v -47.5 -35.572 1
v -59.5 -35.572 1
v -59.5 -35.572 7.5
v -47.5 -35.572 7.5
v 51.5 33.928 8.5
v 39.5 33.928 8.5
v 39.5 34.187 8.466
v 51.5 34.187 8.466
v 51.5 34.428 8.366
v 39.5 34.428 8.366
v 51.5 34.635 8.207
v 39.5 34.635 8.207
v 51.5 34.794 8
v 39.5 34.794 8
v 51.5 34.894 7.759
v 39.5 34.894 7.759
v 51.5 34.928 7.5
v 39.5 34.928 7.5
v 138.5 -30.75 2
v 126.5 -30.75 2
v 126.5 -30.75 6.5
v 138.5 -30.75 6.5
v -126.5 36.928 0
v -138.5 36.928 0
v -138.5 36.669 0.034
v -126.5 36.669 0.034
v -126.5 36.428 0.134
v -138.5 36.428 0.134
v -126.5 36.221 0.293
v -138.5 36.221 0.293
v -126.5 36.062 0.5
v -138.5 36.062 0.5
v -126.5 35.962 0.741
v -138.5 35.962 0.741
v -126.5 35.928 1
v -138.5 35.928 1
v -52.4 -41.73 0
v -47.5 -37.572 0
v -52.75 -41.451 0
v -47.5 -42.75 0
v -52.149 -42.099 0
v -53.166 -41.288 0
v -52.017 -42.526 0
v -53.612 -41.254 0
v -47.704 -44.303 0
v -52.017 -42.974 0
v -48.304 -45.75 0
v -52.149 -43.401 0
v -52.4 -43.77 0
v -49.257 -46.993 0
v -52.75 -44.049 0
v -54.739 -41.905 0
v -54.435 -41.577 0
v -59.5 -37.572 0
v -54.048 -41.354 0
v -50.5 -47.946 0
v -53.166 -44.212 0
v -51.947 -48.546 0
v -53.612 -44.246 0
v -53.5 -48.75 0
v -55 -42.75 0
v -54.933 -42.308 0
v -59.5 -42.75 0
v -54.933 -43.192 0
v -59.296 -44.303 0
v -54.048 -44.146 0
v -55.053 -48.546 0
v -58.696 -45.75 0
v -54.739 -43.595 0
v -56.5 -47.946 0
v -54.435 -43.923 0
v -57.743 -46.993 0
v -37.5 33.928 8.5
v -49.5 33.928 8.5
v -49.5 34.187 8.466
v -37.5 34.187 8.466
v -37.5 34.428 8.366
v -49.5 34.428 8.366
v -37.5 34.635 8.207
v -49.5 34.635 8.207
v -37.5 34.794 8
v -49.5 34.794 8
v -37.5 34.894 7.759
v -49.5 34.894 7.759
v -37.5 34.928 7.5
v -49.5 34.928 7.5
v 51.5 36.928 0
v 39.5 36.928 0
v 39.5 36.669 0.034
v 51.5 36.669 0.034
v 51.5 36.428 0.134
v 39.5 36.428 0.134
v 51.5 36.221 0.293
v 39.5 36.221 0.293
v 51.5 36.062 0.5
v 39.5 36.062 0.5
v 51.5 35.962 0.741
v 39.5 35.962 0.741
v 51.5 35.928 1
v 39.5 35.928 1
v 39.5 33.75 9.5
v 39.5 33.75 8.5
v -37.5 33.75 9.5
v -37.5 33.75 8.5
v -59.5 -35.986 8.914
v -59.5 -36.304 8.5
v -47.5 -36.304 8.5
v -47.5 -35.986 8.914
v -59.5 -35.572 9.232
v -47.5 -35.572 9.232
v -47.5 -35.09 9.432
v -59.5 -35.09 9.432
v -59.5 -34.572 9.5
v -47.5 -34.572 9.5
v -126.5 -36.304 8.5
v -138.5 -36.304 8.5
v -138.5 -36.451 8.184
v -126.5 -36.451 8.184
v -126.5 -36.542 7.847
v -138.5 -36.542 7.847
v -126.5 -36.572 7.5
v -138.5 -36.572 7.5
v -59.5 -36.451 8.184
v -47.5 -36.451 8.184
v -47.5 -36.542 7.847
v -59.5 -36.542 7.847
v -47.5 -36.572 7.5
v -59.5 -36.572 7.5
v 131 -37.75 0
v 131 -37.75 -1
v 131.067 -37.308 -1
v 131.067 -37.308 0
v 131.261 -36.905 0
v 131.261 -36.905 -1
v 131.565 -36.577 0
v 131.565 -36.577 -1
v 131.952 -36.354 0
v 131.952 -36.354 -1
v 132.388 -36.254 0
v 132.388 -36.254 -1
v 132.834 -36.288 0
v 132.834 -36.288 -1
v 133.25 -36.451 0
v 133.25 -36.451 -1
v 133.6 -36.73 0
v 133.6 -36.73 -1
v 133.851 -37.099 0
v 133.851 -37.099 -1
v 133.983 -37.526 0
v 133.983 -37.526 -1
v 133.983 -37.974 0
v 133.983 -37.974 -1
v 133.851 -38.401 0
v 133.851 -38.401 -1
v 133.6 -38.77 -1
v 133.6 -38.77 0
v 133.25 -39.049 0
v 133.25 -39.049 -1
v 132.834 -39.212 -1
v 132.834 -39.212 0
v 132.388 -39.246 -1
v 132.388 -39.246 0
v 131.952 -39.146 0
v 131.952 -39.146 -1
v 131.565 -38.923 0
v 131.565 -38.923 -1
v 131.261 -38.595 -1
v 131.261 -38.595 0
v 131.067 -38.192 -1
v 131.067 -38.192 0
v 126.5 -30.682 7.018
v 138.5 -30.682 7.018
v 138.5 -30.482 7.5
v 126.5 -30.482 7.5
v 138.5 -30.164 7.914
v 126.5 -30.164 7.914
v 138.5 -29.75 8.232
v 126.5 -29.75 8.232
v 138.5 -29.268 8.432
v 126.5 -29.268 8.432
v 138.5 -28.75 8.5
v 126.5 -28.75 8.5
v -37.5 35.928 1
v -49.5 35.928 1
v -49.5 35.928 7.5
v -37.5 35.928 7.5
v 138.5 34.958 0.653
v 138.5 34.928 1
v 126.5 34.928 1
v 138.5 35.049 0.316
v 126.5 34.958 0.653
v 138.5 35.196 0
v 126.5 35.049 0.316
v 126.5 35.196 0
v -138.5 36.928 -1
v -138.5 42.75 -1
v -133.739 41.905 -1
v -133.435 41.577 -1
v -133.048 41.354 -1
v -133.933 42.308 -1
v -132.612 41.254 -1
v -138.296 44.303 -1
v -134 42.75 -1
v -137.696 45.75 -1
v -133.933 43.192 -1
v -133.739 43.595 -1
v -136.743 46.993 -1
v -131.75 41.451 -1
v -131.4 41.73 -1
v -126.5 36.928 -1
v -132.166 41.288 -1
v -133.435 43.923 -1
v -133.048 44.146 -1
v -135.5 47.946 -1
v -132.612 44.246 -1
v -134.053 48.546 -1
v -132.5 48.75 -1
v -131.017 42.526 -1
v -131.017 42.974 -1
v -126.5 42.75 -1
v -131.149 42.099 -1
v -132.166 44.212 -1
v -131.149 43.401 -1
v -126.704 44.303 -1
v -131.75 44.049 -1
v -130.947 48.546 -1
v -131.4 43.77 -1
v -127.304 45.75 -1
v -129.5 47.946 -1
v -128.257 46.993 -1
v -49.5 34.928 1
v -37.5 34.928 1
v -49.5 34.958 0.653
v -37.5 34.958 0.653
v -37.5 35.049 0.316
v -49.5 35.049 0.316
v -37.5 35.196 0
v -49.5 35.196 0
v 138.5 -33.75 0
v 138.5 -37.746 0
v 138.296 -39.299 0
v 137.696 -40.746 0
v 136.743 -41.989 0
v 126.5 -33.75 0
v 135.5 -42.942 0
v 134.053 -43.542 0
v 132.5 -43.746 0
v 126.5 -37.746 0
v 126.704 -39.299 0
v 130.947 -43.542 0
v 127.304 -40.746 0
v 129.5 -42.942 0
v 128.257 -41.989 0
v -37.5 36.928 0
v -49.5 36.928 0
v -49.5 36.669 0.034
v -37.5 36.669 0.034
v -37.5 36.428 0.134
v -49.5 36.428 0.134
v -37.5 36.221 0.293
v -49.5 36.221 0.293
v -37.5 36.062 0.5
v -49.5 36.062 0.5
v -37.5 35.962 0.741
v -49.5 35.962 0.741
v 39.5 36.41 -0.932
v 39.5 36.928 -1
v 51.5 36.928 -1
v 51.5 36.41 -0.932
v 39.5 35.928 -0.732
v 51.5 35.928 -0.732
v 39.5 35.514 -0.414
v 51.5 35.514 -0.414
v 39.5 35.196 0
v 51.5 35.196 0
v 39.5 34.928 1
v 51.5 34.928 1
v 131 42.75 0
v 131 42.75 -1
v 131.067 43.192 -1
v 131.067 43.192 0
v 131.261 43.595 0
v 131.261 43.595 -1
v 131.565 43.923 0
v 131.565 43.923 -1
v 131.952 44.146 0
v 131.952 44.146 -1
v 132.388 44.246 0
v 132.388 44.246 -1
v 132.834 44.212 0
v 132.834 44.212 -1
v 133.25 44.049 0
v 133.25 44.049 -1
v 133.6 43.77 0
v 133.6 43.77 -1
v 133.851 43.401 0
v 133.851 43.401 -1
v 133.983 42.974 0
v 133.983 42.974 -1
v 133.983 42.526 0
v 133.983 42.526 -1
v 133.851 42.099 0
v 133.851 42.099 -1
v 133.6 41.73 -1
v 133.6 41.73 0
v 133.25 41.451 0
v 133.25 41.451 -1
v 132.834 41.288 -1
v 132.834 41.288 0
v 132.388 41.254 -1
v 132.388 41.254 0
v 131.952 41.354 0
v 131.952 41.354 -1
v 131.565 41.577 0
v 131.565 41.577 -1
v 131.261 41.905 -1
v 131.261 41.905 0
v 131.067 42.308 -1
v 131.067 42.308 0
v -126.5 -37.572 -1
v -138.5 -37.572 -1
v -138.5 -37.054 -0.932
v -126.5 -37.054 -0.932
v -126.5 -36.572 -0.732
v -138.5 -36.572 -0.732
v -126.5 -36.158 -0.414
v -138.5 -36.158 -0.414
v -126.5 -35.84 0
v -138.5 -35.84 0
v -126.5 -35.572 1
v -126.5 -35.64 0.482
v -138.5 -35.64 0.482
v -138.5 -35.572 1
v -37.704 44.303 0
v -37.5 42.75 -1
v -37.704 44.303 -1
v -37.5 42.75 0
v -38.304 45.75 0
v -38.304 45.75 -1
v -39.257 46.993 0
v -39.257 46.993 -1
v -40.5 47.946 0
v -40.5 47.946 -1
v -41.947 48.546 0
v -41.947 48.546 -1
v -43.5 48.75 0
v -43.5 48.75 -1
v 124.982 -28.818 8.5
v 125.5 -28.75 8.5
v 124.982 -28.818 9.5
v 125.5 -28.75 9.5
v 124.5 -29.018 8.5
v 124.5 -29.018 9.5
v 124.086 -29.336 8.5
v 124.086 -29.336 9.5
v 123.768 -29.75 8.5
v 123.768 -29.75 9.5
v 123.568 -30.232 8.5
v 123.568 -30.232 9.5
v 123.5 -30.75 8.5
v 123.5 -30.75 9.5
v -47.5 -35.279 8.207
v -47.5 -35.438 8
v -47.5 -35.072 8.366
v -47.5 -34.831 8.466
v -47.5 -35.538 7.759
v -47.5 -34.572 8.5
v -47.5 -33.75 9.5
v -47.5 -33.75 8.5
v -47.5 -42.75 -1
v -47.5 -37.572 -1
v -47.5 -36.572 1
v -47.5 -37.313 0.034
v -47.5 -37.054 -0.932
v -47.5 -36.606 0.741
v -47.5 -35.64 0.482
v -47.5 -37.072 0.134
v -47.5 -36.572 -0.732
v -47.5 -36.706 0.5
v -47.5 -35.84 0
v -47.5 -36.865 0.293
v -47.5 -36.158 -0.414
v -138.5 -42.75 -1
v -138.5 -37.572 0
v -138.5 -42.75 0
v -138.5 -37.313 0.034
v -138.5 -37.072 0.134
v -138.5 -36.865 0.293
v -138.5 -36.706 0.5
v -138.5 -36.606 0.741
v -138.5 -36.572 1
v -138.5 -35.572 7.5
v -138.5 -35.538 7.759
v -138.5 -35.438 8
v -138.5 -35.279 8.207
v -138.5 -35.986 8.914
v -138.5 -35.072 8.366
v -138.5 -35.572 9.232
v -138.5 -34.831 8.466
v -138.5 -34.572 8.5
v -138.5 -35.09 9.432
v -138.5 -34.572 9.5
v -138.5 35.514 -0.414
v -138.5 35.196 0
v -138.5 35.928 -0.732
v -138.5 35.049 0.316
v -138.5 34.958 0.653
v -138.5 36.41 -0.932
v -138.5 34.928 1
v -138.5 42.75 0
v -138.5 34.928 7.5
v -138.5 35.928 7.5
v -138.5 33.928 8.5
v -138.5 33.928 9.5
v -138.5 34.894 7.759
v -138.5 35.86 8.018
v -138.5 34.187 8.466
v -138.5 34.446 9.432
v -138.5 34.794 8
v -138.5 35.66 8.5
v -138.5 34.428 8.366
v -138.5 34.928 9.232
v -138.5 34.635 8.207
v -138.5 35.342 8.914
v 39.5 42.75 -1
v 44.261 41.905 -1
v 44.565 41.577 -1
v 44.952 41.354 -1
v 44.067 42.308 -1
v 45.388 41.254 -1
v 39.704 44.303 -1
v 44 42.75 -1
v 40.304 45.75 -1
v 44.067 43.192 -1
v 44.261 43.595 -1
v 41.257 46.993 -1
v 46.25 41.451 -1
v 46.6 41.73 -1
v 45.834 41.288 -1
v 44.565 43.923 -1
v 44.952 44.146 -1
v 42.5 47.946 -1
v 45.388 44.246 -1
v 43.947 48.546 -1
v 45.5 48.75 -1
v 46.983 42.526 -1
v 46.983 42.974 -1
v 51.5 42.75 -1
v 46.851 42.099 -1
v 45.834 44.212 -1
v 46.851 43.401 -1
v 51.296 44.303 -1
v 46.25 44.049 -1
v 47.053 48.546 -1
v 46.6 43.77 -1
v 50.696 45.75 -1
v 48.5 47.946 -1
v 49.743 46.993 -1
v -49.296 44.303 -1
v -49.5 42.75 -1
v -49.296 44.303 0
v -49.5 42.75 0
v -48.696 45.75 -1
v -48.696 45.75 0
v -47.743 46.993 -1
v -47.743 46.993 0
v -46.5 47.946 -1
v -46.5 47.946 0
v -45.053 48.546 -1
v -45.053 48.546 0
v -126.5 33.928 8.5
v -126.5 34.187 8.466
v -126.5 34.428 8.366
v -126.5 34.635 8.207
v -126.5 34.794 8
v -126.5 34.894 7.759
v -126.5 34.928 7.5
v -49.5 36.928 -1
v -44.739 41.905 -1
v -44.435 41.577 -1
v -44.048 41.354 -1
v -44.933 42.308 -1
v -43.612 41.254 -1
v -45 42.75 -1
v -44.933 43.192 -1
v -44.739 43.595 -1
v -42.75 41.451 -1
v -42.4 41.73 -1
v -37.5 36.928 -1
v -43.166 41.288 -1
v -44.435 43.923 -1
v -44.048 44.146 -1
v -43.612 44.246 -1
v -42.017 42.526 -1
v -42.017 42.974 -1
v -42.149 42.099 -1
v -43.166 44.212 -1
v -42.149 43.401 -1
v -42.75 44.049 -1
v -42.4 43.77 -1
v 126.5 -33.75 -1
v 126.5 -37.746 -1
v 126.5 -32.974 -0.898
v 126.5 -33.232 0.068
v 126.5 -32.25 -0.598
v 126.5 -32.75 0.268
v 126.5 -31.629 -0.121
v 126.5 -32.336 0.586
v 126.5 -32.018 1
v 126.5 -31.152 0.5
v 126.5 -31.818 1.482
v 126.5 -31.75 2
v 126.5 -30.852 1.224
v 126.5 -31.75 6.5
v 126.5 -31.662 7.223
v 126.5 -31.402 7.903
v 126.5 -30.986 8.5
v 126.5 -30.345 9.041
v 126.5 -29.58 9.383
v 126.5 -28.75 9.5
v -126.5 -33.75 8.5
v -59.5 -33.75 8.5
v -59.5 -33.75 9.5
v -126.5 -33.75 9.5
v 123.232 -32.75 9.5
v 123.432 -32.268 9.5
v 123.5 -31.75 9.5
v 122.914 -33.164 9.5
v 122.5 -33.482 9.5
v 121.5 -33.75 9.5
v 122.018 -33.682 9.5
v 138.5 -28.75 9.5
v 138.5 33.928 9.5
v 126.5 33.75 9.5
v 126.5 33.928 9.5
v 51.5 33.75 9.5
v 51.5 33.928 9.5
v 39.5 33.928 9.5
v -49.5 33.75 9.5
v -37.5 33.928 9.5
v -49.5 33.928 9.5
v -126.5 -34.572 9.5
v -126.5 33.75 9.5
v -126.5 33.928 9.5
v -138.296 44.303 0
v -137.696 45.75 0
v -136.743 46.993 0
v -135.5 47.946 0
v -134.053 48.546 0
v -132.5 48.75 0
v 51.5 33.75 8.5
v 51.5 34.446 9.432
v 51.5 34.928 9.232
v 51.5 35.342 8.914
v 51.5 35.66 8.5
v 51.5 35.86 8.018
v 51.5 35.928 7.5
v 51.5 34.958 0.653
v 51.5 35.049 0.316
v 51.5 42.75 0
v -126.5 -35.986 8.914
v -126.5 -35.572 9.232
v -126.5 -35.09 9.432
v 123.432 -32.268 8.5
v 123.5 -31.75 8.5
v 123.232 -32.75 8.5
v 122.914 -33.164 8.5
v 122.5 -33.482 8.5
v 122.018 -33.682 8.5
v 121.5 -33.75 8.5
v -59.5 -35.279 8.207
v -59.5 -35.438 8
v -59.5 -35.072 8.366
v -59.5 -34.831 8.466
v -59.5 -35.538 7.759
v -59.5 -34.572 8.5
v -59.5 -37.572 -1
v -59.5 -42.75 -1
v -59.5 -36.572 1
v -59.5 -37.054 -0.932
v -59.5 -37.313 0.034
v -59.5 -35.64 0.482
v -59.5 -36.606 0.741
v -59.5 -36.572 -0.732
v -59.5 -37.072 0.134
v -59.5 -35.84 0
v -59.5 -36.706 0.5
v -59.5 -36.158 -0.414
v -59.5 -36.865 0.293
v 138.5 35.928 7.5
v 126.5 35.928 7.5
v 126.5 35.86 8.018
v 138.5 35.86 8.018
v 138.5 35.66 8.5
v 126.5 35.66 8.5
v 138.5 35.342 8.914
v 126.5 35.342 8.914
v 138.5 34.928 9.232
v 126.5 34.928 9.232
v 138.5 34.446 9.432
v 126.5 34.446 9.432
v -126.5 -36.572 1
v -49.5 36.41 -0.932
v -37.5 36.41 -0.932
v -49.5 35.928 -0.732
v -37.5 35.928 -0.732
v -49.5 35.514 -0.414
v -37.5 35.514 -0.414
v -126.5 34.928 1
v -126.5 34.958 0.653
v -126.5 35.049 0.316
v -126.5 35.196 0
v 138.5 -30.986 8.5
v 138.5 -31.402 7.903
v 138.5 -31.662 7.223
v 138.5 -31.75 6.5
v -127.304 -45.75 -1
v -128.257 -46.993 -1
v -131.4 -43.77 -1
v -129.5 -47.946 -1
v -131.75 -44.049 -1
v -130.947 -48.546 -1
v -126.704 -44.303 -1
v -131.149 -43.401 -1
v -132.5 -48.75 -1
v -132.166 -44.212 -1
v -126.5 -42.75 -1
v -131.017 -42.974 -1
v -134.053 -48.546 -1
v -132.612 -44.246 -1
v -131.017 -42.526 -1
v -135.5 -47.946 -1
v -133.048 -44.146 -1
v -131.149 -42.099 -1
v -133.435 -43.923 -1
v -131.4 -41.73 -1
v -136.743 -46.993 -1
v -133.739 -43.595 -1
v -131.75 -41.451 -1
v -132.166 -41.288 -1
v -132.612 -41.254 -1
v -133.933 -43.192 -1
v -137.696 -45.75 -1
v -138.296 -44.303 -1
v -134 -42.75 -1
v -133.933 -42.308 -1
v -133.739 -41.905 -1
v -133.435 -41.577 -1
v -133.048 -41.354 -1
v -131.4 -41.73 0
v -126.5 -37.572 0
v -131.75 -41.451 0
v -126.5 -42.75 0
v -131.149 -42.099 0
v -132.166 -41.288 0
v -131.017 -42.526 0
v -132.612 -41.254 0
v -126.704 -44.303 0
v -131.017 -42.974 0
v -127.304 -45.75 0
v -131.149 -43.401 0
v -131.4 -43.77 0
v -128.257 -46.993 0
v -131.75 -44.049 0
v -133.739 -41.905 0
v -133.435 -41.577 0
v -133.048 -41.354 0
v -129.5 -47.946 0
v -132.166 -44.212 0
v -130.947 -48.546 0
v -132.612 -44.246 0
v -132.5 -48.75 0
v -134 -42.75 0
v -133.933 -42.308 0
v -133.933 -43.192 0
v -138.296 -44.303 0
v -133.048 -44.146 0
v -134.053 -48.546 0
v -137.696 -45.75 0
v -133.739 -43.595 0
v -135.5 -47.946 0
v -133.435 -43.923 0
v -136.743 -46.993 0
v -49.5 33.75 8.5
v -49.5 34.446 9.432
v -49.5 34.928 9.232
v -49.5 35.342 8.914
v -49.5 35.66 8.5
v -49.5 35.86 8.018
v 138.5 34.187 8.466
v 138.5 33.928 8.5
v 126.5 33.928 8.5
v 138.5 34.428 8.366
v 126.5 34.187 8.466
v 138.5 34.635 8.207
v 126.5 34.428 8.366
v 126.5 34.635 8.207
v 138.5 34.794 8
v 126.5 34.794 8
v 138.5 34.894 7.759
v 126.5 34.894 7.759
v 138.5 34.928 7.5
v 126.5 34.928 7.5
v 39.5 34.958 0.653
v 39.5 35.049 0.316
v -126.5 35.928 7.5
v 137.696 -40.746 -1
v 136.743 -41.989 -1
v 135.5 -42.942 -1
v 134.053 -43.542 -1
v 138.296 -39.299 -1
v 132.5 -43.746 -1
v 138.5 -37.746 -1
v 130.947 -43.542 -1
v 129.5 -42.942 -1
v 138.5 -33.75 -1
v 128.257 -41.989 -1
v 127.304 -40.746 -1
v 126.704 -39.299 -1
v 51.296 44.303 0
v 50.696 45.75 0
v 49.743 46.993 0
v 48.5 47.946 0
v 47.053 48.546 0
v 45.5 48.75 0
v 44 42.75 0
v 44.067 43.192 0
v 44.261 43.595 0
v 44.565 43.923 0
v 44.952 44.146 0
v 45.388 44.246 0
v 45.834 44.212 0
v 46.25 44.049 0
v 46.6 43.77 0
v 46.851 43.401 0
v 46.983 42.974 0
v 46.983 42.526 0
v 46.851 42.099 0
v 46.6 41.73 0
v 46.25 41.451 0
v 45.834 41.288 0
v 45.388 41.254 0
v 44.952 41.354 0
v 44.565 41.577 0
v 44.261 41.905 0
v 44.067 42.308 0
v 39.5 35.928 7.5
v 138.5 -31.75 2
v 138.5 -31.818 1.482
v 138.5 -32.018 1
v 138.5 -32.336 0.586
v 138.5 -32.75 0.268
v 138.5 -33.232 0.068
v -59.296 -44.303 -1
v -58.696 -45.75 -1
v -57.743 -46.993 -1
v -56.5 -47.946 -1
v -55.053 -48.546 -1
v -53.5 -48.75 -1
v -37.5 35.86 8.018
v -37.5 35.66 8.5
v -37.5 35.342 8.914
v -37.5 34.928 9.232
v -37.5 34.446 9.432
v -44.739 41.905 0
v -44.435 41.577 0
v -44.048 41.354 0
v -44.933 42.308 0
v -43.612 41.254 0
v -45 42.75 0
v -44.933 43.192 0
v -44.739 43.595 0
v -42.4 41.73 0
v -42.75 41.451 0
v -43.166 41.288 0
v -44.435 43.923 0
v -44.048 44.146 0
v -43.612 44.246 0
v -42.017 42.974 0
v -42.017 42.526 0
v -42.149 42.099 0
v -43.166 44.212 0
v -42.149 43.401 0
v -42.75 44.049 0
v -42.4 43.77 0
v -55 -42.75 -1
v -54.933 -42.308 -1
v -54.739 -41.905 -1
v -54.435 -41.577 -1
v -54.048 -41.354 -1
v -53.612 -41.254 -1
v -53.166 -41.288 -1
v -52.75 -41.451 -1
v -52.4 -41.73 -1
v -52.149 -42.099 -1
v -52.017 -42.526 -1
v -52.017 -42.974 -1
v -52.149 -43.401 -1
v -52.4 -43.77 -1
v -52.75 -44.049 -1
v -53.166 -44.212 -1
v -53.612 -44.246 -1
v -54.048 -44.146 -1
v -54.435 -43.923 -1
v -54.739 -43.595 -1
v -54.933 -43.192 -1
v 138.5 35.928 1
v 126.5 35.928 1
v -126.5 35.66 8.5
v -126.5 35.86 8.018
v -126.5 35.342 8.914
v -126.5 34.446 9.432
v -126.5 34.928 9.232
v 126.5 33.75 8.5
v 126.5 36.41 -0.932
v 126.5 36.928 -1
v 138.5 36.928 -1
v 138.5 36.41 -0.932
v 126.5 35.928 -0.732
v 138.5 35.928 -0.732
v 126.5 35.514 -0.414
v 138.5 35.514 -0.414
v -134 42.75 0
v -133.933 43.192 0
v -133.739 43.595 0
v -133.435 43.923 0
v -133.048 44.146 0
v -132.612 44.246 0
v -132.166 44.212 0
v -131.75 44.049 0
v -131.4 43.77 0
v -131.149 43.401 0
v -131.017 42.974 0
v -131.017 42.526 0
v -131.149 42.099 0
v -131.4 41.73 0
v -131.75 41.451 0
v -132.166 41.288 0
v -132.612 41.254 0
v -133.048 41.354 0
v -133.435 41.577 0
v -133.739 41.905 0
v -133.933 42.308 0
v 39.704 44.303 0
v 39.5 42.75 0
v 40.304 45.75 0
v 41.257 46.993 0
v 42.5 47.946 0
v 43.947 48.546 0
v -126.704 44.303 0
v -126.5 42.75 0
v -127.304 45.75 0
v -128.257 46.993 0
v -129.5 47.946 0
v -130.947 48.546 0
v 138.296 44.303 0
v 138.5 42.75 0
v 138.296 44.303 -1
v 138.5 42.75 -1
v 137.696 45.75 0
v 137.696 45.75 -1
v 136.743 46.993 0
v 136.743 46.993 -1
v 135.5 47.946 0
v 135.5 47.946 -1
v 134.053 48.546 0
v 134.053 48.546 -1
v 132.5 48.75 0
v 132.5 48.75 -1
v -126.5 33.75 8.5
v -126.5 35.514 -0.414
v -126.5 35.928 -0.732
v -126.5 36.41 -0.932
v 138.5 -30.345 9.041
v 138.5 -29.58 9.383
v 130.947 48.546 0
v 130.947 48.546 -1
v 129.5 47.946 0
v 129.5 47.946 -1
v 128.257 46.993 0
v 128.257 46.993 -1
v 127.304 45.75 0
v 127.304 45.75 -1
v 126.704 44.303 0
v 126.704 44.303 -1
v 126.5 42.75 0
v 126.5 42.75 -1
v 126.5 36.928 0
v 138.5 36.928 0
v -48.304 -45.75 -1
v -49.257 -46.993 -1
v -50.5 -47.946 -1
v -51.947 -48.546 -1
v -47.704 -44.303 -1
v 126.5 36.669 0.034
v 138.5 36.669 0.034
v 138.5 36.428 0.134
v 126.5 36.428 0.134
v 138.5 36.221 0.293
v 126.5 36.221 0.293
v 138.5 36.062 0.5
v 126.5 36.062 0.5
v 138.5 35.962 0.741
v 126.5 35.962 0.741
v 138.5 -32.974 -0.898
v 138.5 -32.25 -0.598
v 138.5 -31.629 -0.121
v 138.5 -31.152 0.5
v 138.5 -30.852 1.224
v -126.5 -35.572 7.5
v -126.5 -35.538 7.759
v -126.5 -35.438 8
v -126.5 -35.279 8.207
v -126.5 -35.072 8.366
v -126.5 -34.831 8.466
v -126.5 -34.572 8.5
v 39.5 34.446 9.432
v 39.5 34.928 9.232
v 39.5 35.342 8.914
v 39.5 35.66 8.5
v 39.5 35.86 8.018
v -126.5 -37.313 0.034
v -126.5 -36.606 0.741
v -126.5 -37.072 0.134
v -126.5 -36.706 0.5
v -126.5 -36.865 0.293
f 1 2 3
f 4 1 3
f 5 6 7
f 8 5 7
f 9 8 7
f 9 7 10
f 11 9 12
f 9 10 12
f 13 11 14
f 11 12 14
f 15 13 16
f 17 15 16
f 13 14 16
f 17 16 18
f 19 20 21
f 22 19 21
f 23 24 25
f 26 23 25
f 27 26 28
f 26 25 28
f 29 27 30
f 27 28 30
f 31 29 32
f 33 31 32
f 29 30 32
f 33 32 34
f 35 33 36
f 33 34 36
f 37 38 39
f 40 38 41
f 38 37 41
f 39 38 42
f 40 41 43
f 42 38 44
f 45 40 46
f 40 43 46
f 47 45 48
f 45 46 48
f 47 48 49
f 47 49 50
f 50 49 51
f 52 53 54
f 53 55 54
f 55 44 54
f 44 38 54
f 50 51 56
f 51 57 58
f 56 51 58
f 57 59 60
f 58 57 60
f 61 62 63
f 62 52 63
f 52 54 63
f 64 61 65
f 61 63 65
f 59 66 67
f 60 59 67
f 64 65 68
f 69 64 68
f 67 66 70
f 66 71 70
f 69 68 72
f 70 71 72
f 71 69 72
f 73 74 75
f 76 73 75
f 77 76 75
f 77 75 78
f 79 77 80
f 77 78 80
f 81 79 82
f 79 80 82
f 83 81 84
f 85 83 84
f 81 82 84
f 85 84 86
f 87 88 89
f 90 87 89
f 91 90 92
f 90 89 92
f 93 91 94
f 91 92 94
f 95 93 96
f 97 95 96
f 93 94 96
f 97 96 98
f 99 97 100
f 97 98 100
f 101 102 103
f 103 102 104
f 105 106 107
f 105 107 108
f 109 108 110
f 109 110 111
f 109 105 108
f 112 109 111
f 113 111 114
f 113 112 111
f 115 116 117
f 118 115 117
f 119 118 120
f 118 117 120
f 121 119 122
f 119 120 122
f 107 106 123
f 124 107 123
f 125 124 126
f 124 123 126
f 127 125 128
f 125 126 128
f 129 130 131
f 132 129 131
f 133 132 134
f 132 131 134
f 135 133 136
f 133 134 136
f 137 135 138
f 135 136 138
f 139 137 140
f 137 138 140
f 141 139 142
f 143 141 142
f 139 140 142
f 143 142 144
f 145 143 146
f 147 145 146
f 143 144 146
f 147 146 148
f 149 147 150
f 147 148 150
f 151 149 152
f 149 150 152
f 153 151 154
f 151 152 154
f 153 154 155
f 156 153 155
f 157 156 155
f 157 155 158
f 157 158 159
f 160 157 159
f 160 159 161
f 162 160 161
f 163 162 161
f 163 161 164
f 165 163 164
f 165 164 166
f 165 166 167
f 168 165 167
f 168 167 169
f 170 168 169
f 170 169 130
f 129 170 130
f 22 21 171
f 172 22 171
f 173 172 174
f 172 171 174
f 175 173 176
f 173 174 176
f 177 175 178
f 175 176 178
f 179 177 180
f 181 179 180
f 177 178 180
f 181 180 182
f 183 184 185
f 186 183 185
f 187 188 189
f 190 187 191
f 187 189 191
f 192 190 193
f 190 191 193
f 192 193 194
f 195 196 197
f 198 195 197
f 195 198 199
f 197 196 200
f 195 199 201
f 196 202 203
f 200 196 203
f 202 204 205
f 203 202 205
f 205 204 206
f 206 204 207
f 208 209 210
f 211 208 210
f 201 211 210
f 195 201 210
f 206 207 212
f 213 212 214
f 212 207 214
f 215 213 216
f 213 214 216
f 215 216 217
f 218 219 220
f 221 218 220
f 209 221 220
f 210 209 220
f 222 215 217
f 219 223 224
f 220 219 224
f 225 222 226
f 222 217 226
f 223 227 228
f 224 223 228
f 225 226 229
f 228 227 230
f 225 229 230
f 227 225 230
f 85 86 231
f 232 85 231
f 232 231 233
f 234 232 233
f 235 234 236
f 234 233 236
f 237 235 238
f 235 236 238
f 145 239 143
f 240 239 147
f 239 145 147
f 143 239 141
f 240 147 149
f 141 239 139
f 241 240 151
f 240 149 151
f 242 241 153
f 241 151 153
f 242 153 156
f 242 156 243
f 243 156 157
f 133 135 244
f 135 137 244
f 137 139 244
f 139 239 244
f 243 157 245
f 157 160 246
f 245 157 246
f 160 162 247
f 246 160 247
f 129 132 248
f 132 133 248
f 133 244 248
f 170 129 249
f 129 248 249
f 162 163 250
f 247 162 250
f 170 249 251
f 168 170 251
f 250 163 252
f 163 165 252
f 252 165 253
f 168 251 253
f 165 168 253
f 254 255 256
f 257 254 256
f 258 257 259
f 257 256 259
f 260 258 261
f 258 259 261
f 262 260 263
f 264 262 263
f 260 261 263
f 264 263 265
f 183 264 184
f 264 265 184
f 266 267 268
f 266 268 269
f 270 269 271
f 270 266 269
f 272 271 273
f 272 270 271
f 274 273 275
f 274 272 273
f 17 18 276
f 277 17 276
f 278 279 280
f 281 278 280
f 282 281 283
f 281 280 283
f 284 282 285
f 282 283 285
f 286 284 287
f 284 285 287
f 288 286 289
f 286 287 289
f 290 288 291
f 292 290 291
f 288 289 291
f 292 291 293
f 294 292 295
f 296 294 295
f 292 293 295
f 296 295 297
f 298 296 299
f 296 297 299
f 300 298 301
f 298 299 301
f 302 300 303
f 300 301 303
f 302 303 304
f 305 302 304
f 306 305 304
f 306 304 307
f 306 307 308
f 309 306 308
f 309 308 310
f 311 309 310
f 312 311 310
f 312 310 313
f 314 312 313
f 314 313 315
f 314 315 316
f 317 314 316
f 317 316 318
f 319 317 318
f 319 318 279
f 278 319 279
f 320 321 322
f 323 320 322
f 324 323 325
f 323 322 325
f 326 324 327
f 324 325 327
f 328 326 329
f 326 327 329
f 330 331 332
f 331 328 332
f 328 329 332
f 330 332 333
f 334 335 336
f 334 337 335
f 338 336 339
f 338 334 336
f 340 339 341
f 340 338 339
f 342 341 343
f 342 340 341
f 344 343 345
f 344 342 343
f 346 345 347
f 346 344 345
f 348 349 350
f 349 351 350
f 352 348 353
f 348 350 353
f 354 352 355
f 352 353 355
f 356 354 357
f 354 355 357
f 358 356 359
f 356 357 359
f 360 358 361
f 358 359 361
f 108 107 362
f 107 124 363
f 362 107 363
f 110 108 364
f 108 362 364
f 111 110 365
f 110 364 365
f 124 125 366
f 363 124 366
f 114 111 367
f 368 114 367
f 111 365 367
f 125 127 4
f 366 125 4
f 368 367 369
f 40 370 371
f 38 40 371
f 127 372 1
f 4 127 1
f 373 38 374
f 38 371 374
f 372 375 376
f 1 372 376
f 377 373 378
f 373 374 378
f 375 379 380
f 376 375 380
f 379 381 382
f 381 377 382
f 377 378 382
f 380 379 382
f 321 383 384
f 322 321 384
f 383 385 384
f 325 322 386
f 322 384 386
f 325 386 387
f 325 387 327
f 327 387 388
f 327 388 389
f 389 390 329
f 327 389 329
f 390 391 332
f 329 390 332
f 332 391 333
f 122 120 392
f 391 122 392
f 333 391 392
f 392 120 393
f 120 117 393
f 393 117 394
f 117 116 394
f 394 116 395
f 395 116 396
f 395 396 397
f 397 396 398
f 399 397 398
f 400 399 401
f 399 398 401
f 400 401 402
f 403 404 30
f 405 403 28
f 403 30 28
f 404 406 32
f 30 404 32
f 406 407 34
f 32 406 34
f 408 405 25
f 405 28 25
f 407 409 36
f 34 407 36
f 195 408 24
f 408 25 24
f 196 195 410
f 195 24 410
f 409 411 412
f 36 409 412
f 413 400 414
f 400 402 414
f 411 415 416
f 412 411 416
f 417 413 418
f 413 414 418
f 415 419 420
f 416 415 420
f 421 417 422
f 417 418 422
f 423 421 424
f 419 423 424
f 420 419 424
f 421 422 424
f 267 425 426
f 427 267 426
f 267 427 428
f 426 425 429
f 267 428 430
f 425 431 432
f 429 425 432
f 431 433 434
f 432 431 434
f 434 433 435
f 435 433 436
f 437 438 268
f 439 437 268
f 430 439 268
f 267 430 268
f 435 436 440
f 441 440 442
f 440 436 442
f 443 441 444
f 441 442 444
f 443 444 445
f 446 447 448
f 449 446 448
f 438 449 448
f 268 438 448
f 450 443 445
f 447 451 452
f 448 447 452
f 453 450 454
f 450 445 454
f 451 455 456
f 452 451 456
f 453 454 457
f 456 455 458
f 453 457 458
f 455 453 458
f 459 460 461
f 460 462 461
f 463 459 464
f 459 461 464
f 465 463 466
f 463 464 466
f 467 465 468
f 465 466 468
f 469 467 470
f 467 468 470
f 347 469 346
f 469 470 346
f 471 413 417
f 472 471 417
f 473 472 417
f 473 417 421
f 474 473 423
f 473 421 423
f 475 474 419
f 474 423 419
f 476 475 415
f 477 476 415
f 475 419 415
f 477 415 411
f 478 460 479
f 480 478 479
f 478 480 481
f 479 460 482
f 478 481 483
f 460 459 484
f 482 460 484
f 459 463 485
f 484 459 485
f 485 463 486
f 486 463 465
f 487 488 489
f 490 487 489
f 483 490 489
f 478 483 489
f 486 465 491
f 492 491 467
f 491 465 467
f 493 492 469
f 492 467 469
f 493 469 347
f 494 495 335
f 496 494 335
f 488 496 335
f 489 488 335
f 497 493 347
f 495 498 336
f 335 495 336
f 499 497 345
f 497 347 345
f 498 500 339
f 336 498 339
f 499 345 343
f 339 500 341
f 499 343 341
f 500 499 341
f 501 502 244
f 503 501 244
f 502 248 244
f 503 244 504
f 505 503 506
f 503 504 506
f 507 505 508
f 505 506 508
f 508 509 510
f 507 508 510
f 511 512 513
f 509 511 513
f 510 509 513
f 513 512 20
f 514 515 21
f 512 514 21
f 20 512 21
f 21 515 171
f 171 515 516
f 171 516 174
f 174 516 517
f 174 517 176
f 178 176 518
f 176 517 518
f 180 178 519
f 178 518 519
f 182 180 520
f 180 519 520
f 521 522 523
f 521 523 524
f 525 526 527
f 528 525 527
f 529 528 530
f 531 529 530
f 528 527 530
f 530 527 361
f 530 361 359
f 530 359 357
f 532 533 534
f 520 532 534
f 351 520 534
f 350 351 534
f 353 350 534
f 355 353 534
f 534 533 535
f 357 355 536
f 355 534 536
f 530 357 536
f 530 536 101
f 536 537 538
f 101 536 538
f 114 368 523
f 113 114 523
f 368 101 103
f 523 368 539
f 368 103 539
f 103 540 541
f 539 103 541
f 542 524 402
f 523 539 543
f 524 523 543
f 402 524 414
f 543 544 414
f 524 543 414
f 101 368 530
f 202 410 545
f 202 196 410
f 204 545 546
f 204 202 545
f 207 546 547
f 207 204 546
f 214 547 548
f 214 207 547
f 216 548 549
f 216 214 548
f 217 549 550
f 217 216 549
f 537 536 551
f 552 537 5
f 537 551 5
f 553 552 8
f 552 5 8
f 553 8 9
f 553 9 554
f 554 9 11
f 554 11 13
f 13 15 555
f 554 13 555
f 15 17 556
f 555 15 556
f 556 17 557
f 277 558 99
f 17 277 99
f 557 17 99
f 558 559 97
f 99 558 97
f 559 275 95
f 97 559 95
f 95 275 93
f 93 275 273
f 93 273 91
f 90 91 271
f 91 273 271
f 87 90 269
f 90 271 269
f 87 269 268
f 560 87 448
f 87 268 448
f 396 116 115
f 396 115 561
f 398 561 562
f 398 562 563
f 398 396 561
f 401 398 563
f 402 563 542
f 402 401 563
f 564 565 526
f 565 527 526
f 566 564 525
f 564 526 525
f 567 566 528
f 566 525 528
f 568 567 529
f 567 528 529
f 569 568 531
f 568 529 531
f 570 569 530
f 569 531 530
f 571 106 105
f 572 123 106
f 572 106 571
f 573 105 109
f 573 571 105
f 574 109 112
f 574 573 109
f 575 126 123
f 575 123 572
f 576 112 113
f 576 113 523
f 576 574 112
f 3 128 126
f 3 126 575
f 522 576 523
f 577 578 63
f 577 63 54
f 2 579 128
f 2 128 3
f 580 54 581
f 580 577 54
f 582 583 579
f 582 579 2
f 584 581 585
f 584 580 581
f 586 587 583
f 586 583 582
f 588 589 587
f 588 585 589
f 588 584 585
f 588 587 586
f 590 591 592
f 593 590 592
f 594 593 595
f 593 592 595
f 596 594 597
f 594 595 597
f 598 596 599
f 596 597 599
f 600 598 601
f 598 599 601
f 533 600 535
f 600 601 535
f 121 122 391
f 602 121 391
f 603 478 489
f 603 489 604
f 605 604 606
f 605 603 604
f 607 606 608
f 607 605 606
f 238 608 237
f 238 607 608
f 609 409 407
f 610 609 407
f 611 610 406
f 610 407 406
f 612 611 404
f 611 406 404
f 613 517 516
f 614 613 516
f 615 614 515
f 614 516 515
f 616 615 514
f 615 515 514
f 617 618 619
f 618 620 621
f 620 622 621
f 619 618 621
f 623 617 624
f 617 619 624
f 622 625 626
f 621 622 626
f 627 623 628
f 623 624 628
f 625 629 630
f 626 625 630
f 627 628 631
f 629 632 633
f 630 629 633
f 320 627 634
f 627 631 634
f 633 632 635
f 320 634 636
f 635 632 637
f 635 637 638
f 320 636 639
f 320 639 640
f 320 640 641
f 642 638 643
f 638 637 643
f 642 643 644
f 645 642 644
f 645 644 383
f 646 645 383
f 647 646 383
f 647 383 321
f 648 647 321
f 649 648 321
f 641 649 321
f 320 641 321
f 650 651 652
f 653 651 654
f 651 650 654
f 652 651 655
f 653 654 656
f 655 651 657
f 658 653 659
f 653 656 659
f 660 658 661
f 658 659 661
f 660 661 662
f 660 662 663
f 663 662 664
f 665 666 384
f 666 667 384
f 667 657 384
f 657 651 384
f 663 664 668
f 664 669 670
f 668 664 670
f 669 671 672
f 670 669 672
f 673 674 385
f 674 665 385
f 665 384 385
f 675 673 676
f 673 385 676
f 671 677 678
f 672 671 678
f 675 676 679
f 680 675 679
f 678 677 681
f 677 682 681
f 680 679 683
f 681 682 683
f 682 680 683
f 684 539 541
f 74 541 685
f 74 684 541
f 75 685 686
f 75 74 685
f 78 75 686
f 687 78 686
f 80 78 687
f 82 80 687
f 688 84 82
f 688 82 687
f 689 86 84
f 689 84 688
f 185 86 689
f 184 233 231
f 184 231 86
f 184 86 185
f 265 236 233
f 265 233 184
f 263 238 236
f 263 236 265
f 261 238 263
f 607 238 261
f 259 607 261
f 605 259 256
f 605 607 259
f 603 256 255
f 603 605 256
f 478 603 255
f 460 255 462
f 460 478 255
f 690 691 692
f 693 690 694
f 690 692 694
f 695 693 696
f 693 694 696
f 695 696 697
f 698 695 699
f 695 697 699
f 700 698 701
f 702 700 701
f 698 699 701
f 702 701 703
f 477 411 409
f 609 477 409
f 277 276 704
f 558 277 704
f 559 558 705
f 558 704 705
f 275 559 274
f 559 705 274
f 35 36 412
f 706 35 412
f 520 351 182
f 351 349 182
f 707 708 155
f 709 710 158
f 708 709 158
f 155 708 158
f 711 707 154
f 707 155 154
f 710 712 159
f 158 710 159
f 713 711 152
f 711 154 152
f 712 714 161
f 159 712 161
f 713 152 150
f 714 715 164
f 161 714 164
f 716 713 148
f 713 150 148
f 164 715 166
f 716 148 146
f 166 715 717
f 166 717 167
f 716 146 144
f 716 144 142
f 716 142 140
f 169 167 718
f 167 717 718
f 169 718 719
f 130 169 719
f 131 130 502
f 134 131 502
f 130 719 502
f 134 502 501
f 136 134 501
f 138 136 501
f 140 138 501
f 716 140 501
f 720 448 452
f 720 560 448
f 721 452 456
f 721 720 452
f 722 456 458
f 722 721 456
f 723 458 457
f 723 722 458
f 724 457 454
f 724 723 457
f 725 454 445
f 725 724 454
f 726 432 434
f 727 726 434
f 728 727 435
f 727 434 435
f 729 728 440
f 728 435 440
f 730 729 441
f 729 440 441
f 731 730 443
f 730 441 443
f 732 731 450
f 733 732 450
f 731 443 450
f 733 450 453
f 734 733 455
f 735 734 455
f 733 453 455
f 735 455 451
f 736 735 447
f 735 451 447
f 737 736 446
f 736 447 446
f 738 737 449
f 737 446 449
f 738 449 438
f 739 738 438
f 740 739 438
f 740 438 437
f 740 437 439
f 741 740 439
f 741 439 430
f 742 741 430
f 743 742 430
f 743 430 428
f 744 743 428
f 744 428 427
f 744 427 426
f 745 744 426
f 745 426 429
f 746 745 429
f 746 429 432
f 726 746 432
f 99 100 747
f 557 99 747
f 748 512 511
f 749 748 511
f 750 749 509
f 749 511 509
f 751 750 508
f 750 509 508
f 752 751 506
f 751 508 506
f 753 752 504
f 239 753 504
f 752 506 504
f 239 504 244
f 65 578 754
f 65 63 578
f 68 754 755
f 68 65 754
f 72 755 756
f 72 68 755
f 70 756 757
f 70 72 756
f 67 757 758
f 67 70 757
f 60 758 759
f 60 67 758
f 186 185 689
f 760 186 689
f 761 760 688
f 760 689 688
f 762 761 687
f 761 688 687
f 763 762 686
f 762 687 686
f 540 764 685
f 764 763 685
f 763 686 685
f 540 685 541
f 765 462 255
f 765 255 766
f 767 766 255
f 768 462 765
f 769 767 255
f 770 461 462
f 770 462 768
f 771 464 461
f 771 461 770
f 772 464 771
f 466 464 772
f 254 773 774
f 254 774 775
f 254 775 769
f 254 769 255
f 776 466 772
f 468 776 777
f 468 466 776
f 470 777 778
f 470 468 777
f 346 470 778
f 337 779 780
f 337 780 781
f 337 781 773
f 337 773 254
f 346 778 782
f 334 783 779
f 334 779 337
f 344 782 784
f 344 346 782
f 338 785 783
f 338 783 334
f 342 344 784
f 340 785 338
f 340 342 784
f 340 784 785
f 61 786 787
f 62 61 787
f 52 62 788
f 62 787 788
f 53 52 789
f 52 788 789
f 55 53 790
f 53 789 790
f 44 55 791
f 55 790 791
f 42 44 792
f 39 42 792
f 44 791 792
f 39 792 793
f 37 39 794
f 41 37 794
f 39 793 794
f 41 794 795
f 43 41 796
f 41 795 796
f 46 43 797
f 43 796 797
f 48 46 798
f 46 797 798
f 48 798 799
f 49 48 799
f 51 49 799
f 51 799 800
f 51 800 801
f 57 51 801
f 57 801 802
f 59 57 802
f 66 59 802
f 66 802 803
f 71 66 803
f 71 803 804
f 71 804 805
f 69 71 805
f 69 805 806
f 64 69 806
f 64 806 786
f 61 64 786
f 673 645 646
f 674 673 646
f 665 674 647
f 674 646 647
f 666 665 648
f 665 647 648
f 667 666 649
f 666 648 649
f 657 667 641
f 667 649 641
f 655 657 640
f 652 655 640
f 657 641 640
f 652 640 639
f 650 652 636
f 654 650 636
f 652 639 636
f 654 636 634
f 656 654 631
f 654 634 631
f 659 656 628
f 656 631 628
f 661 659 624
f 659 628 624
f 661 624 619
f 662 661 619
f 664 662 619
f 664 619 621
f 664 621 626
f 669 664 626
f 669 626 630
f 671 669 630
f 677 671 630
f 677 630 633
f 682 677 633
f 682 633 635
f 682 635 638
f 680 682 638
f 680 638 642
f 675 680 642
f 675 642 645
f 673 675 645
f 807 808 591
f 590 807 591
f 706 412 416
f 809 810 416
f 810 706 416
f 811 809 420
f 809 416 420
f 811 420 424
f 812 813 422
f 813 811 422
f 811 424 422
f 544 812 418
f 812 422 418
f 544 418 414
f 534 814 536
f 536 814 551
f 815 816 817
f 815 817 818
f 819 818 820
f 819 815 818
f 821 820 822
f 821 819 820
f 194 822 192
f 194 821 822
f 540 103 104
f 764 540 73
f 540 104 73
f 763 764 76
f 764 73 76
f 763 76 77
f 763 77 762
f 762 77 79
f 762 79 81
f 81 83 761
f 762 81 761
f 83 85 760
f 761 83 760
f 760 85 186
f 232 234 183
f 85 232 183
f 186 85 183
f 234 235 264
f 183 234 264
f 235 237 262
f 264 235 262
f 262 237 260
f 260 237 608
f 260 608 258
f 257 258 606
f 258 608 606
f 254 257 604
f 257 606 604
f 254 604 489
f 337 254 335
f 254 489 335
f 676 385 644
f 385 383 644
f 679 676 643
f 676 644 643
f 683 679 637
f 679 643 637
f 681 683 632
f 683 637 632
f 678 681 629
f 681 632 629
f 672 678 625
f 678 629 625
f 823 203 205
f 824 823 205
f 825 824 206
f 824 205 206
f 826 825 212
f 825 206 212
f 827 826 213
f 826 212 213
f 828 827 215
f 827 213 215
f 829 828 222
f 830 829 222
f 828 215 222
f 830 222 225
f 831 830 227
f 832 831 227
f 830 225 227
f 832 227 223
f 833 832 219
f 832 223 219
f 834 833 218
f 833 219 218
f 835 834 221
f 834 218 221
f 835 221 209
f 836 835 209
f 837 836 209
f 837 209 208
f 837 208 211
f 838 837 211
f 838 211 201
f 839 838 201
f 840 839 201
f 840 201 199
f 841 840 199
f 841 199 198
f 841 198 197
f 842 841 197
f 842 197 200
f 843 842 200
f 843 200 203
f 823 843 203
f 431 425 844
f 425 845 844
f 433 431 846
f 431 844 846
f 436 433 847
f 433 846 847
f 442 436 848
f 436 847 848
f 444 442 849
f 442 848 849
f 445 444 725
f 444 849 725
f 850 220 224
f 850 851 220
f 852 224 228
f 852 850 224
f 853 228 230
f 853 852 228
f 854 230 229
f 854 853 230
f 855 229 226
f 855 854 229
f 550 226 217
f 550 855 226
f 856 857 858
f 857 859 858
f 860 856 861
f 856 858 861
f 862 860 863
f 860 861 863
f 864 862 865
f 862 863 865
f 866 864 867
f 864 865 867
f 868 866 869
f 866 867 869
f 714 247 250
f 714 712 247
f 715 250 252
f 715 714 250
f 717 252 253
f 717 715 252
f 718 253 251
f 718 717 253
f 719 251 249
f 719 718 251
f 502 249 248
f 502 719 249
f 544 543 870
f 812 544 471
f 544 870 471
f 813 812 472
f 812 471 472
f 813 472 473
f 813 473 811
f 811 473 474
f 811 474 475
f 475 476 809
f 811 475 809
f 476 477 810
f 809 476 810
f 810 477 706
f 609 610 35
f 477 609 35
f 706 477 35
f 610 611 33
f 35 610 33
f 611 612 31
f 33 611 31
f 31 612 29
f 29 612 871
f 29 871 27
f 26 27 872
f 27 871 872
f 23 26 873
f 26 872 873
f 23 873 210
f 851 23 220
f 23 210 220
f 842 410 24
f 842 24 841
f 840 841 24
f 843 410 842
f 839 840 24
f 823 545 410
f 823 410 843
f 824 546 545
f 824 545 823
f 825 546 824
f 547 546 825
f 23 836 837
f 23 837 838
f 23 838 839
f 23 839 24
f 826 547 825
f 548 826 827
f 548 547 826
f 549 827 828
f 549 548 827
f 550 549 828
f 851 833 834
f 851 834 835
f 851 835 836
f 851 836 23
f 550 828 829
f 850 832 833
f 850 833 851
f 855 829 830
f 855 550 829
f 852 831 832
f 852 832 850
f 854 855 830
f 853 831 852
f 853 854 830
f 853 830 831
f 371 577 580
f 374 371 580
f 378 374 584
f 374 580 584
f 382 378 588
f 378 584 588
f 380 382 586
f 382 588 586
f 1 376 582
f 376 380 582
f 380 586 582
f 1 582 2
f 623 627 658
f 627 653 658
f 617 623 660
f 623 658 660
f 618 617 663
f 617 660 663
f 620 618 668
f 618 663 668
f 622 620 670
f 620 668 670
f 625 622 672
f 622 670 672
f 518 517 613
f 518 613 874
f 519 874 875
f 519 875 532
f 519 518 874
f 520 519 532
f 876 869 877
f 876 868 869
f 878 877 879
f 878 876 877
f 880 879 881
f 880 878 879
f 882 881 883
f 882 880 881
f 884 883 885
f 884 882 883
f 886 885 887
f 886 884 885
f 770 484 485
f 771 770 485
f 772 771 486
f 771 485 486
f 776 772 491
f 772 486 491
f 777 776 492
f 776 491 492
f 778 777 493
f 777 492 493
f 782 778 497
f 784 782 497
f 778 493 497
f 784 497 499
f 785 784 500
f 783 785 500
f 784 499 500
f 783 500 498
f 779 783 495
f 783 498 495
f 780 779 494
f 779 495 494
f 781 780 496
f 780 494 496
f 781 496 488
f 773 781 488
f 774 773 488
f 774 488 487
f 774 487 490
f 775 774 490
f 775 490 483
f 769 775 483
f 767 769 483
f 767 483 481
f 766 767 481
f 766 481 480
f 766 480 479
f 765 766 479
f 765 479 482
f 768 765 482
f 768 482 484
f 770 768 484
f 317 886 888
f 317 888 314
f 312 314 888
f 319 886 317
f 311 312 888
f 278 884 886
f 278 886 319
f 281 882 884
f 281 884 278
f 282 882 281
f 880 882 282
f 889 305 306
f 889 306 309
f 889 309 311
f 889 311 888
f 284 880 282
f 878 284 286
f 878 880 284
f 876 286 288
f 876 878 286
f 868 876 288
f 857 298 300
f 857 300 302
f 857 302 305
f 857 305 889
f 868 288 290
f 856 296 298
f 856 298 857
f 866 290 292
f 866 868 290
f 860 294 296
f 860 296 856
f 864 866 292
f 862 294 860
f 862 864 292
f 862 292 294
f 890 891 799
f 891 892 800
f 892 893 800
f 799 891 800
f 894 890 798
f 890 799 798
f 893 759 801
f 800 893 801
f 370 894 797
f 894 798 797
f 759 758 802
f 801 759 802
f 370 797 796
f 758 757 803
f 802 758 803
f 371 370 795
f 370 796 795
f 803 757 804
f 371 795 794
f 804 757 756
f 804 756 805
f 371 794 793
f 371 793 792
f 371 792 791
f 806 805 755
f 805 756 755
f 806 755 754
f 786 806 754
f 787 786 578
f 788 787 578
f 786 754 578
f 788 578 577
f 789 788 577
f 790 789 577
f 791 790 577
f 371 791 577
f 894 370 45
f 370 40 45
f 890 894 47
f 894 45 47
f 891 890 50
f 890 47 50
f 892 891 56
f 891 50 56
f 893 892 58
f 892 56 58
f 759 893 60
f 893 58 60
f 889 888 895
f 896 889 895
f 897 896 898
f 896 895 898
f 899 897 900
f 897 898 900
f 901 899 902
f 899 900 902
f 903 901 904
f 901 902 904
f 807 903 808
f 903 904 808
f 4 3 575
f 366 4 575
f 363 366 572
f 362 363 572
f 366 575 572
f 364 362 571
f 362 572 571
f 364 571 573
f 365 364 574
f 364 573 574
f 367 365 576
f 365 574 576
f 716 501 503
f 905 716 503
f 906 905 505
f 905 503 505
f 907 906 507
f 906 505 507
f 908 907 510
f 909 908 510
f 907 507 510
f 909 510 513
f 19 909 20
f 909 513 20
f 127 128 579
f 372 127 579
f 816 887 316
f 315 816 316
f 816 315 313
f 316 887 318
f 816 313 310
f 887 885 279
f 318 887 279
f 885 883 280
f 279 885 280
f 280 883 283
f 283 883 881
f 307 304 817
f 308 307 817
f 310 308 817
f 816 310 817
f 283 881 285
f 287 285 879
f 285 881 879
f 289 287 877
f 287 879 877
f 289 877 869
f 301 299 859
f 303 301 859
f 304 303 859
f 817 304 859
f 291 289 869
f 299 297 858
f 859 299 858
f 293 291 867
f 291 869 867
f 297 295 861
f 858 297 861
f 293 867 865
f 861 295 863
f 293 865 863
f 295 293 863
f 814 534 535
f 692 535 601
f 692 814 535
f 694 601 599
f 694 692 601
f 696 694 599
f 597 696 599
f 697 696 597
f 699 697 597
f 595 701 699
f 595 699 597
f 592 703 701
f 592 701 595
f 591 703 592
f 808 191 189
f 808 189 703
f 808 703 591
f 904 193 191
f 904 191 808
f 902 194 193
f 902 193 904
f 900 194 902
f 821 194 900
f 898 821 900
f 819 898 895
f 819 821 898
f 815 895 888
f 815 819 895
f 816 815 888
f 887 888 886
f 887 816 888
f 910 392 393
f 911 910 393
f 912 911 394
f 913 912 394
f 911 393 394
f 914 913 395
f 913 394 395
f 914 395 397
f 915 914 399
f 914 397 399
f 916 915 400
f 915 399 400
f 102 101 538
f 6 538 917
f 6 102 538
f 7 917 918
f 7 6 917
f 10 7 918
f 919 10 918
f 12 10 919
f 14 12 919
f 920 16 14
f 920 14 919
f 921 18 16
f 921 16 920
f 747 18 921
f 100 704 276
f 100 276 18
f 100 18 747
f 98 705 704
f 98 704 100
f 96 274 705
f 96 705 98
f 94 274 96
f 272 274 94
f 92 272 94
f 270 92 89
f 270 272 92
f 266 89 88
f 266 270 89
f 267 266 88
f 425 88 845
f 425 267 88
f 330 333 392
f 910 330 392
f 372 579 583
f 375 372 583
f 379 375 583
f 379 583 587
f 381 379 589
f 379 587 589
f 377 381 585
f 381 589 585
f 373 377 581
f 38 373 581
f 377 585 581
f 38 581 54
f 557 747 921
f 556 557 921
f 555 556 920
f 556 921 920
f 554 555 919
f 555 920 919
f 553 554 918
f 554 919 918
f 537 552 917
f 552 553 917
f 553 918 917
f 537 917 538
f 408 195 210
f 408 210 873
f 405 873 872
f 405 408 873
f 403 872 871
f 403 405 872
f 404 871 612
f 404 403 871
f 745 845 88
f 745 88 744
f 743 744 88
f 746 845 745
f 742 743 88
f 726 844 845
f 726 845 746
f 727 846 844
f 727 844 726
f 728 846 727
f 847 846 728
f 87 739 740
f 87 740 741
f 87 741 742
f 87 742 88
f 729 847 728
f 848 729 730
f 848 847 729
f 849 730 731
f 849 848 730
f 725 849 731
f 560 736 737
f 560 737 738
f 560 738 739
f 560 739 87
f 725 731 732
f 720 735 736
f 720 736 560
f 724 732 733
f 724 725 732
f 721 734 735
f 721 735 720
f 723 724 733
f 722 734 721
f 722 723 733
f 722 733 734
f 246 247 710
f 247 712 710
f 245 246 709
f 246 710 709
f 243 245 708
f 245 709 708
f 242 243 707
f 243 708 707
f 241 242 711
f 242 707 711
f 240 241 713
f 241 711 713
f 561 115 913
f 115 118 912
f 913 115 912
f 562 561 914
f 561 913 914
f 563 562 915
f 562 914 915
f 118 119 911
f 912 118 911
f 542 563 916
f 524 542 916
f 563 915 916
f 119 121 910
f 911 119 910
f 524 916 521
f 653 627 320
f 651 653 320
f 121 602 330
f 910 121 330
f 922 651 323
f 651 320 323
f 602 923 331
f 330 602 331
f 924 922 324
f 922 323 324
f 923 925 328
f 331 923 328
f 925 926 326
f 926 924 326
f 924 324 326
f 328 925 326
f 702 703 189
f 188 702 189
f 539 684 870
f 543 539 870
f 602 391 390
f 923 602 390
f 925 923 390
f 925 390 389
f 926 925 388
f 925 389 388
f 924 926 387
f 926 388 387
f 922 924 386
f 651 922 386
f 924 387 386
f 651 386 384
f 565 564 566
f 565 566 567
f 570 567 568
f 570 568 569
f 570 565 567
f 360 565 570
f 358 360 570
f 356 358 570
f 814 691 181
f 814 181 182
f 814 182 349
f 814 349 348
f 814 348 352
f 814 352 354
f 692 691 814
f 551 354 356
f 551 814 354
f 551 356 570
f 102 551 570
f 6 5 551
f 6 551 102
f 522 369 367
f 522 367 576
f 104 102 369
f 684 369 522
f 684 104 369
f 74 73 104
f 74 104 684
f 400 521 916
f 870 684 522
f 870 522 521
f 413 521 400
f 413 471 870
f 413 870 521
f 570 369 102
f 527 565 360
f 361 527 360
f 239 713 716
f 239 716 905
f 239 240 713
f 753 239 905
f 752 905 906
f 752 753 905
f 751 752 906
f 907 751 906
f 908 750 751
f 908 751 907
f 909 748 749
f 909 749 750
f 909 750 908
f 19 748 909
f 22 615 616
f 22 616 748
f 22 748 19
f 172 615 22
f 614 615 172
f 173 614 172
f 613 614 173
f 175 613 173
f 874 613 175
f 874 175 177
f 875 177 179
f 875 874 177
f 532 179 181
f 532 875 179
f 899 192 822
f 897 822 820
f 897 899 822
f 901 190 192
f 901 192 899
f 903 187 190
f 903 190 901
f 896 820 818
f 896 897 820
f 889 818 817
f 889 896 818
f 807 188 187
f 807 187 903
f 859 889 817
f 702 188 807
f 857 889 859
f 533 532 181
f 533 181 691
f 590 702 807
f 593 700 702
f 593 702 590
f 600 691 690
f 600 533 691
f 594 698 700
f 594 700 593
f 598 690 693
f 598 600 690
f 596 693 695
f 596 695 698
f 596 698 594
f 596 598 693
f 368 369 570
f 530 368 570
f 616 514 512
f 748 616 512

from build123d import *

# Parameters (mm, degrees)
SKETCH1_W          = 277
SKETCH1_H          = 97.5
BASE_FLANGE1_DEPTH = 1
JOG1_START         = -138.5
JOG1_DEPTH         = 277
JOG1_2_DEPTH       = 277
JOG2_START         = -138.5
JOG2_DEPTH         = 277
JOG2_2_DEPTH       = 277
SKETCH11_W         = 67
SKETCH11_H         = 15
SKETCH11_W_2       = 75
SKETCH11_W_3       = 77
CUT_EXTRUDE1_DEPTH = 148.204152455
SKETCH16_W         = 12
SKETCH16_H         = 22.35
TAB1_DEPTH         = 1
JOG4_START         = 126.5
JOG4_DEPTH         = 12
JOG4_2_DEPTH       = 12
SKETCH22_R         = 1.5
SCREW_HOLES_DEPTH  = 148.204152455
FILLET1_R          = 6
FILLET2_R          = 2


# Read off the part's stored shape, not the designer's step: Jog1, Jog2, Jog4
# Sheet-metal steps are written as plain solids
with BuildPart() as part:
    # Sketch1 → Base-Flange1 (new body)
    with BuildSketch(Plane.XY):
        Rectangle(SKETCH1_W, SKETCH1_H)
    extrude(amount=-BASE_FLANGE1_DEPTH)

    # Jog1 outline → Jog1 (cut)
    with BuildSketch(Plane.YZ.offset(JOG1_START)):
        with BuildLine():
            ThreePointArc((36.928097245, -1), (35.928097245, -0.732050807), (35.196046438, 0))
            Line((35.196046438, 0), (-48.75, 0))
            Line((-48.75, 0), (-48.75, -1))
            Line((-48.75, -1), (36.928097245, -1))
        make_face()
    extrude(amount=JOG1_DEPTH, mode=Mode.SUBTRACT)

    # Jog1 2 outline → Jog1 2 (add)
    with BuildSketch(Plane.YZ.offset(JOG1_START)):
        with BuildLine():
            Line((34.928097245, 7.5), (34.928097245, 1))
            ThreePointArc((34.928097245, 1), (34.996245593, 0.48236191), (35.196046438, 0))
            Line((35.196046438, 0), (36.928097245, 0))
            ThreePointArc((36.928097245, 0), (36.220990464, 0.292893219), (35.928097245, 1))
            Line((35.928097245, 1), (35.928097245, 7.5))
            ThreePointArc((35.928097245, 7.5), (35.342310807, 8.914213562), (33.928097245, 9.5))
            Line((33.928097245, 9.5), (-48.75, 9.5))
            Line((-48.75, 9.5), (-48.75, 8.5))
            Line((-48.75, 8.5), (33.928097245, 8.5))
            ThreePointArc((33.928097245, 8.5), (34.635204026, 8.207106781), (34.928097245, 7.5))
        make_face()
    extrude(amount=JOG1_2_DEPTH)

    # Jog2 outline → Jog2 (cut)
    with BuildSketch(Plane.YZ.offset(JOG2_START)):
        with BuildLine():
            Line((-48.75, 8.5), (-36.303953562, 8.5))
            ThreePointArc((-36.303953562, 8.5), (-35.571902755, 9.232050807), (-34.571902755, 9.5))
            Line((-34.571902755, 9.5), (-48.75, 9.5))
            Line((-48.75, 9.5), (-48.75, 8.5))
        make_face()
    extrude(amount=JOG2_DEPTH, mode=Mode.SUBTRACT)

    # Jog2 2 outline → Jog2 2 (add)
    with BuildSketch(Plane.YZ.offset(JOG2_START)):
        with BuildLine():
            Line((-48.75, -1), (-37.571902755, -1))
            ThreePointArc((-37.571902755, -1), (-36.157689193, -0.414213562), (-35.571902755, 1))
            Line((-35.571902755, 1), (-35.571902755, 7.5))
            ThreePointArc((-35.571902755, 7.5), (-35.279009536, 8.207106781), (-34.571902755, 8.5))
            Line((-34.571902755, 8.5), (-36.303953562, 8.5))
            ThreePointArc((-36.303953562, 8.5), (-36.503754407, 8.01763809), (-36.571902755, 7.5))
            Line((-36.571902755, 7.5), (-36.571902755, 1))
            ThreePointArc((-36.571902755, 1), (-36.864795974, 0.292893219), (-37.571902755, 0))
            Line((-37.571902755, 0), (-48.75, 0))
            Line((-48.75, 0), (-48.75, -1))
        make_face()
    extrude(amount=JOG2_2_DEPTH)

    # Sketch11 → Cut-Extrude1 (cut, through all)
    with BuildSketch(Plane(origin=(0, 0, -1), x_dir=(-1, 0, 0), z_dir=(0, 0, -1))):
        Polygon((-138.5, -48.75), (-123.5, -48.75), (-111.5, -48.75), (47.5, -48.75), (47.5, -33.75), (-111.5, -33.75), (-123.5, -33.75), (-123.5, -28.75), (-138.5, -28.75), align=None)
        with Locations((93, -41.25)):
            Rectangle(SKETCH11_W, SKETCH11_H)
        with Locations((-89, 41.25)):
            Rectangle(SKETCH11_W_2, SKETCH11_H)
        with Locations((-1, 41.25)):
            Rectangle(SKETCH11_W_3, SKETCH11_H)
        with Locations((88, 41.25)):
            Rectangle(SKETCH11_W_3, SKETCH11_H)
    extrude(amount=-CUT_EXTRUDE1_DEPTH, mode=Mode.SUBTRACT)

    # Sketch16 → Tab1 (add)
    with BuildSketch(Plane(origin=(0, 0, 8.5), x_dir=(-1, 0, 0), z_dir=(0, 0, -1))):
        with Locations((-132.5, -39.925)):
            Rectangle(SKETCH16_W, SKETCH16_H)
    extrude(amount=-TAB1_DEPTH)

    # Jog4 outline → Jog4 (cut)
    with BuildSketch(Plane.YZ.offset(JOG4_START)):
        with BuildLine():
            Line((-51.1, 8.5), (-30.986067978, 8.5))
            ThreePointArc((-30.986067978, 8.5), (-29.974744872, 9.238612788), (-28.75, 9.5))
            Line((-28.75, 9.5), (-51.1, 9.5))
            Line((-51.1, 9.5), (-51.1, 8.5))
        make_face()
    extrude(amount=JOG4_DEPTH, mode=Mode.SUBTRACT)

    # Jog4 2 outline → Jog4 2 (add)
    with BuildSketch(Plane.YZ.offset(JOG4_START)):
        with BuildLine():
            Line((-43.746018366, -1), (-33.75, -1))
            ThreePointArc((-33.75, -1), (-31.628679656, -0.121320344), (-30.75, 2))
            Line((-30.75, 2), (-30.75, 6.5))
            ThreePointArc((-30.75, 6.5), (-30.164213562, 7.914213562), (-28.75, 8.5))
            Line((-28.75, 8.5), (-30.986067978, 8.5))
            ThreePointArc((-30.986067978, 8.5), (-31.552517077, 7.570466269), (-31.75, 6.5))
            Line((-31.75, 6.5), (-31.75, 2))
            ThreePointArc((-31.75, 2), (-32.335786438, 0.585786438), (-33.75, 0))
            Line((-33.75, 0), (-43.746018366, 0))
            Line((-43.746018366, 0), (-43.746018366, -1))
        make_face()
    extrude(amount=JOG4_2_DEPTH)

    # Sketch22 → SCREW HOLES (cut, through all)
    with BuildSketch(Plane(origin=(0, 0, -1), x_dir=(-1, 0, 0), z_dir=(0, 0, -1))):
        with Locations((132.5, 42.75)):
            Circle(SKETCH22_R)
        with Locations((132.5, -42.75)):
            Circle(SKETCH22_R)
        with Locations((43.5, 42.75)):
            Circle(SKETCH22_R)
        with Locations((53.5, -42.75)):
            Circle(SKETCH22_R)
        with Locations((-45.5, 42.75)):
            Circle(SKETCH22_R)
        with Locations((-132.5, 42.75)):
            Circle(SKETCH22_R)
        with Locations((-132.5, -37.75)):
            Circle(SKETCH22_R)
    extrude(amount=-SCREW_HOLES_DEPTH, mode=Mode.SUBTRACT)

    # Fillet1
    fillet1_edges = [part.edges().sort_by_distance(p)[0] for p in [
        (39.5, 48.75, -0.5),
        (51.5, 48.75, -0.5),
        (-49.5, 48.75, -0.5),
        (-37.5, 48.75, -0.5),
        (-126.5, 48.75, -0.5),
        (-138.5, 48.75, -0.5),
        (-138.5, -48.75, -0.5),
        (-126.5, -48.75, -0.5),
        (-47.5, -48.75, -0.5),
        (-59.5, -48.75, -0.5),
        (138.5, -43.746018366, -0.5),
        (126.5, -43.746018366, -0.5),
        (138.5, 48.75, -0.5),
        (126.5, 48.75, -0.5),
    ]]
    fillet(fillet1_edges, radius=FILLET1_R - 0.0001)  # a hair under: the kernel refuses the full size

    # Fillet2
    fillet2_edges = [part.edges().sort_by_distance(p)[0] for p in [
        (123.5, -28.75, 9),
        (123.5, -33.75, 9),
    ]]
    fillet(fillet2_edges, radius=FILLET2_R)


solid = part.part
